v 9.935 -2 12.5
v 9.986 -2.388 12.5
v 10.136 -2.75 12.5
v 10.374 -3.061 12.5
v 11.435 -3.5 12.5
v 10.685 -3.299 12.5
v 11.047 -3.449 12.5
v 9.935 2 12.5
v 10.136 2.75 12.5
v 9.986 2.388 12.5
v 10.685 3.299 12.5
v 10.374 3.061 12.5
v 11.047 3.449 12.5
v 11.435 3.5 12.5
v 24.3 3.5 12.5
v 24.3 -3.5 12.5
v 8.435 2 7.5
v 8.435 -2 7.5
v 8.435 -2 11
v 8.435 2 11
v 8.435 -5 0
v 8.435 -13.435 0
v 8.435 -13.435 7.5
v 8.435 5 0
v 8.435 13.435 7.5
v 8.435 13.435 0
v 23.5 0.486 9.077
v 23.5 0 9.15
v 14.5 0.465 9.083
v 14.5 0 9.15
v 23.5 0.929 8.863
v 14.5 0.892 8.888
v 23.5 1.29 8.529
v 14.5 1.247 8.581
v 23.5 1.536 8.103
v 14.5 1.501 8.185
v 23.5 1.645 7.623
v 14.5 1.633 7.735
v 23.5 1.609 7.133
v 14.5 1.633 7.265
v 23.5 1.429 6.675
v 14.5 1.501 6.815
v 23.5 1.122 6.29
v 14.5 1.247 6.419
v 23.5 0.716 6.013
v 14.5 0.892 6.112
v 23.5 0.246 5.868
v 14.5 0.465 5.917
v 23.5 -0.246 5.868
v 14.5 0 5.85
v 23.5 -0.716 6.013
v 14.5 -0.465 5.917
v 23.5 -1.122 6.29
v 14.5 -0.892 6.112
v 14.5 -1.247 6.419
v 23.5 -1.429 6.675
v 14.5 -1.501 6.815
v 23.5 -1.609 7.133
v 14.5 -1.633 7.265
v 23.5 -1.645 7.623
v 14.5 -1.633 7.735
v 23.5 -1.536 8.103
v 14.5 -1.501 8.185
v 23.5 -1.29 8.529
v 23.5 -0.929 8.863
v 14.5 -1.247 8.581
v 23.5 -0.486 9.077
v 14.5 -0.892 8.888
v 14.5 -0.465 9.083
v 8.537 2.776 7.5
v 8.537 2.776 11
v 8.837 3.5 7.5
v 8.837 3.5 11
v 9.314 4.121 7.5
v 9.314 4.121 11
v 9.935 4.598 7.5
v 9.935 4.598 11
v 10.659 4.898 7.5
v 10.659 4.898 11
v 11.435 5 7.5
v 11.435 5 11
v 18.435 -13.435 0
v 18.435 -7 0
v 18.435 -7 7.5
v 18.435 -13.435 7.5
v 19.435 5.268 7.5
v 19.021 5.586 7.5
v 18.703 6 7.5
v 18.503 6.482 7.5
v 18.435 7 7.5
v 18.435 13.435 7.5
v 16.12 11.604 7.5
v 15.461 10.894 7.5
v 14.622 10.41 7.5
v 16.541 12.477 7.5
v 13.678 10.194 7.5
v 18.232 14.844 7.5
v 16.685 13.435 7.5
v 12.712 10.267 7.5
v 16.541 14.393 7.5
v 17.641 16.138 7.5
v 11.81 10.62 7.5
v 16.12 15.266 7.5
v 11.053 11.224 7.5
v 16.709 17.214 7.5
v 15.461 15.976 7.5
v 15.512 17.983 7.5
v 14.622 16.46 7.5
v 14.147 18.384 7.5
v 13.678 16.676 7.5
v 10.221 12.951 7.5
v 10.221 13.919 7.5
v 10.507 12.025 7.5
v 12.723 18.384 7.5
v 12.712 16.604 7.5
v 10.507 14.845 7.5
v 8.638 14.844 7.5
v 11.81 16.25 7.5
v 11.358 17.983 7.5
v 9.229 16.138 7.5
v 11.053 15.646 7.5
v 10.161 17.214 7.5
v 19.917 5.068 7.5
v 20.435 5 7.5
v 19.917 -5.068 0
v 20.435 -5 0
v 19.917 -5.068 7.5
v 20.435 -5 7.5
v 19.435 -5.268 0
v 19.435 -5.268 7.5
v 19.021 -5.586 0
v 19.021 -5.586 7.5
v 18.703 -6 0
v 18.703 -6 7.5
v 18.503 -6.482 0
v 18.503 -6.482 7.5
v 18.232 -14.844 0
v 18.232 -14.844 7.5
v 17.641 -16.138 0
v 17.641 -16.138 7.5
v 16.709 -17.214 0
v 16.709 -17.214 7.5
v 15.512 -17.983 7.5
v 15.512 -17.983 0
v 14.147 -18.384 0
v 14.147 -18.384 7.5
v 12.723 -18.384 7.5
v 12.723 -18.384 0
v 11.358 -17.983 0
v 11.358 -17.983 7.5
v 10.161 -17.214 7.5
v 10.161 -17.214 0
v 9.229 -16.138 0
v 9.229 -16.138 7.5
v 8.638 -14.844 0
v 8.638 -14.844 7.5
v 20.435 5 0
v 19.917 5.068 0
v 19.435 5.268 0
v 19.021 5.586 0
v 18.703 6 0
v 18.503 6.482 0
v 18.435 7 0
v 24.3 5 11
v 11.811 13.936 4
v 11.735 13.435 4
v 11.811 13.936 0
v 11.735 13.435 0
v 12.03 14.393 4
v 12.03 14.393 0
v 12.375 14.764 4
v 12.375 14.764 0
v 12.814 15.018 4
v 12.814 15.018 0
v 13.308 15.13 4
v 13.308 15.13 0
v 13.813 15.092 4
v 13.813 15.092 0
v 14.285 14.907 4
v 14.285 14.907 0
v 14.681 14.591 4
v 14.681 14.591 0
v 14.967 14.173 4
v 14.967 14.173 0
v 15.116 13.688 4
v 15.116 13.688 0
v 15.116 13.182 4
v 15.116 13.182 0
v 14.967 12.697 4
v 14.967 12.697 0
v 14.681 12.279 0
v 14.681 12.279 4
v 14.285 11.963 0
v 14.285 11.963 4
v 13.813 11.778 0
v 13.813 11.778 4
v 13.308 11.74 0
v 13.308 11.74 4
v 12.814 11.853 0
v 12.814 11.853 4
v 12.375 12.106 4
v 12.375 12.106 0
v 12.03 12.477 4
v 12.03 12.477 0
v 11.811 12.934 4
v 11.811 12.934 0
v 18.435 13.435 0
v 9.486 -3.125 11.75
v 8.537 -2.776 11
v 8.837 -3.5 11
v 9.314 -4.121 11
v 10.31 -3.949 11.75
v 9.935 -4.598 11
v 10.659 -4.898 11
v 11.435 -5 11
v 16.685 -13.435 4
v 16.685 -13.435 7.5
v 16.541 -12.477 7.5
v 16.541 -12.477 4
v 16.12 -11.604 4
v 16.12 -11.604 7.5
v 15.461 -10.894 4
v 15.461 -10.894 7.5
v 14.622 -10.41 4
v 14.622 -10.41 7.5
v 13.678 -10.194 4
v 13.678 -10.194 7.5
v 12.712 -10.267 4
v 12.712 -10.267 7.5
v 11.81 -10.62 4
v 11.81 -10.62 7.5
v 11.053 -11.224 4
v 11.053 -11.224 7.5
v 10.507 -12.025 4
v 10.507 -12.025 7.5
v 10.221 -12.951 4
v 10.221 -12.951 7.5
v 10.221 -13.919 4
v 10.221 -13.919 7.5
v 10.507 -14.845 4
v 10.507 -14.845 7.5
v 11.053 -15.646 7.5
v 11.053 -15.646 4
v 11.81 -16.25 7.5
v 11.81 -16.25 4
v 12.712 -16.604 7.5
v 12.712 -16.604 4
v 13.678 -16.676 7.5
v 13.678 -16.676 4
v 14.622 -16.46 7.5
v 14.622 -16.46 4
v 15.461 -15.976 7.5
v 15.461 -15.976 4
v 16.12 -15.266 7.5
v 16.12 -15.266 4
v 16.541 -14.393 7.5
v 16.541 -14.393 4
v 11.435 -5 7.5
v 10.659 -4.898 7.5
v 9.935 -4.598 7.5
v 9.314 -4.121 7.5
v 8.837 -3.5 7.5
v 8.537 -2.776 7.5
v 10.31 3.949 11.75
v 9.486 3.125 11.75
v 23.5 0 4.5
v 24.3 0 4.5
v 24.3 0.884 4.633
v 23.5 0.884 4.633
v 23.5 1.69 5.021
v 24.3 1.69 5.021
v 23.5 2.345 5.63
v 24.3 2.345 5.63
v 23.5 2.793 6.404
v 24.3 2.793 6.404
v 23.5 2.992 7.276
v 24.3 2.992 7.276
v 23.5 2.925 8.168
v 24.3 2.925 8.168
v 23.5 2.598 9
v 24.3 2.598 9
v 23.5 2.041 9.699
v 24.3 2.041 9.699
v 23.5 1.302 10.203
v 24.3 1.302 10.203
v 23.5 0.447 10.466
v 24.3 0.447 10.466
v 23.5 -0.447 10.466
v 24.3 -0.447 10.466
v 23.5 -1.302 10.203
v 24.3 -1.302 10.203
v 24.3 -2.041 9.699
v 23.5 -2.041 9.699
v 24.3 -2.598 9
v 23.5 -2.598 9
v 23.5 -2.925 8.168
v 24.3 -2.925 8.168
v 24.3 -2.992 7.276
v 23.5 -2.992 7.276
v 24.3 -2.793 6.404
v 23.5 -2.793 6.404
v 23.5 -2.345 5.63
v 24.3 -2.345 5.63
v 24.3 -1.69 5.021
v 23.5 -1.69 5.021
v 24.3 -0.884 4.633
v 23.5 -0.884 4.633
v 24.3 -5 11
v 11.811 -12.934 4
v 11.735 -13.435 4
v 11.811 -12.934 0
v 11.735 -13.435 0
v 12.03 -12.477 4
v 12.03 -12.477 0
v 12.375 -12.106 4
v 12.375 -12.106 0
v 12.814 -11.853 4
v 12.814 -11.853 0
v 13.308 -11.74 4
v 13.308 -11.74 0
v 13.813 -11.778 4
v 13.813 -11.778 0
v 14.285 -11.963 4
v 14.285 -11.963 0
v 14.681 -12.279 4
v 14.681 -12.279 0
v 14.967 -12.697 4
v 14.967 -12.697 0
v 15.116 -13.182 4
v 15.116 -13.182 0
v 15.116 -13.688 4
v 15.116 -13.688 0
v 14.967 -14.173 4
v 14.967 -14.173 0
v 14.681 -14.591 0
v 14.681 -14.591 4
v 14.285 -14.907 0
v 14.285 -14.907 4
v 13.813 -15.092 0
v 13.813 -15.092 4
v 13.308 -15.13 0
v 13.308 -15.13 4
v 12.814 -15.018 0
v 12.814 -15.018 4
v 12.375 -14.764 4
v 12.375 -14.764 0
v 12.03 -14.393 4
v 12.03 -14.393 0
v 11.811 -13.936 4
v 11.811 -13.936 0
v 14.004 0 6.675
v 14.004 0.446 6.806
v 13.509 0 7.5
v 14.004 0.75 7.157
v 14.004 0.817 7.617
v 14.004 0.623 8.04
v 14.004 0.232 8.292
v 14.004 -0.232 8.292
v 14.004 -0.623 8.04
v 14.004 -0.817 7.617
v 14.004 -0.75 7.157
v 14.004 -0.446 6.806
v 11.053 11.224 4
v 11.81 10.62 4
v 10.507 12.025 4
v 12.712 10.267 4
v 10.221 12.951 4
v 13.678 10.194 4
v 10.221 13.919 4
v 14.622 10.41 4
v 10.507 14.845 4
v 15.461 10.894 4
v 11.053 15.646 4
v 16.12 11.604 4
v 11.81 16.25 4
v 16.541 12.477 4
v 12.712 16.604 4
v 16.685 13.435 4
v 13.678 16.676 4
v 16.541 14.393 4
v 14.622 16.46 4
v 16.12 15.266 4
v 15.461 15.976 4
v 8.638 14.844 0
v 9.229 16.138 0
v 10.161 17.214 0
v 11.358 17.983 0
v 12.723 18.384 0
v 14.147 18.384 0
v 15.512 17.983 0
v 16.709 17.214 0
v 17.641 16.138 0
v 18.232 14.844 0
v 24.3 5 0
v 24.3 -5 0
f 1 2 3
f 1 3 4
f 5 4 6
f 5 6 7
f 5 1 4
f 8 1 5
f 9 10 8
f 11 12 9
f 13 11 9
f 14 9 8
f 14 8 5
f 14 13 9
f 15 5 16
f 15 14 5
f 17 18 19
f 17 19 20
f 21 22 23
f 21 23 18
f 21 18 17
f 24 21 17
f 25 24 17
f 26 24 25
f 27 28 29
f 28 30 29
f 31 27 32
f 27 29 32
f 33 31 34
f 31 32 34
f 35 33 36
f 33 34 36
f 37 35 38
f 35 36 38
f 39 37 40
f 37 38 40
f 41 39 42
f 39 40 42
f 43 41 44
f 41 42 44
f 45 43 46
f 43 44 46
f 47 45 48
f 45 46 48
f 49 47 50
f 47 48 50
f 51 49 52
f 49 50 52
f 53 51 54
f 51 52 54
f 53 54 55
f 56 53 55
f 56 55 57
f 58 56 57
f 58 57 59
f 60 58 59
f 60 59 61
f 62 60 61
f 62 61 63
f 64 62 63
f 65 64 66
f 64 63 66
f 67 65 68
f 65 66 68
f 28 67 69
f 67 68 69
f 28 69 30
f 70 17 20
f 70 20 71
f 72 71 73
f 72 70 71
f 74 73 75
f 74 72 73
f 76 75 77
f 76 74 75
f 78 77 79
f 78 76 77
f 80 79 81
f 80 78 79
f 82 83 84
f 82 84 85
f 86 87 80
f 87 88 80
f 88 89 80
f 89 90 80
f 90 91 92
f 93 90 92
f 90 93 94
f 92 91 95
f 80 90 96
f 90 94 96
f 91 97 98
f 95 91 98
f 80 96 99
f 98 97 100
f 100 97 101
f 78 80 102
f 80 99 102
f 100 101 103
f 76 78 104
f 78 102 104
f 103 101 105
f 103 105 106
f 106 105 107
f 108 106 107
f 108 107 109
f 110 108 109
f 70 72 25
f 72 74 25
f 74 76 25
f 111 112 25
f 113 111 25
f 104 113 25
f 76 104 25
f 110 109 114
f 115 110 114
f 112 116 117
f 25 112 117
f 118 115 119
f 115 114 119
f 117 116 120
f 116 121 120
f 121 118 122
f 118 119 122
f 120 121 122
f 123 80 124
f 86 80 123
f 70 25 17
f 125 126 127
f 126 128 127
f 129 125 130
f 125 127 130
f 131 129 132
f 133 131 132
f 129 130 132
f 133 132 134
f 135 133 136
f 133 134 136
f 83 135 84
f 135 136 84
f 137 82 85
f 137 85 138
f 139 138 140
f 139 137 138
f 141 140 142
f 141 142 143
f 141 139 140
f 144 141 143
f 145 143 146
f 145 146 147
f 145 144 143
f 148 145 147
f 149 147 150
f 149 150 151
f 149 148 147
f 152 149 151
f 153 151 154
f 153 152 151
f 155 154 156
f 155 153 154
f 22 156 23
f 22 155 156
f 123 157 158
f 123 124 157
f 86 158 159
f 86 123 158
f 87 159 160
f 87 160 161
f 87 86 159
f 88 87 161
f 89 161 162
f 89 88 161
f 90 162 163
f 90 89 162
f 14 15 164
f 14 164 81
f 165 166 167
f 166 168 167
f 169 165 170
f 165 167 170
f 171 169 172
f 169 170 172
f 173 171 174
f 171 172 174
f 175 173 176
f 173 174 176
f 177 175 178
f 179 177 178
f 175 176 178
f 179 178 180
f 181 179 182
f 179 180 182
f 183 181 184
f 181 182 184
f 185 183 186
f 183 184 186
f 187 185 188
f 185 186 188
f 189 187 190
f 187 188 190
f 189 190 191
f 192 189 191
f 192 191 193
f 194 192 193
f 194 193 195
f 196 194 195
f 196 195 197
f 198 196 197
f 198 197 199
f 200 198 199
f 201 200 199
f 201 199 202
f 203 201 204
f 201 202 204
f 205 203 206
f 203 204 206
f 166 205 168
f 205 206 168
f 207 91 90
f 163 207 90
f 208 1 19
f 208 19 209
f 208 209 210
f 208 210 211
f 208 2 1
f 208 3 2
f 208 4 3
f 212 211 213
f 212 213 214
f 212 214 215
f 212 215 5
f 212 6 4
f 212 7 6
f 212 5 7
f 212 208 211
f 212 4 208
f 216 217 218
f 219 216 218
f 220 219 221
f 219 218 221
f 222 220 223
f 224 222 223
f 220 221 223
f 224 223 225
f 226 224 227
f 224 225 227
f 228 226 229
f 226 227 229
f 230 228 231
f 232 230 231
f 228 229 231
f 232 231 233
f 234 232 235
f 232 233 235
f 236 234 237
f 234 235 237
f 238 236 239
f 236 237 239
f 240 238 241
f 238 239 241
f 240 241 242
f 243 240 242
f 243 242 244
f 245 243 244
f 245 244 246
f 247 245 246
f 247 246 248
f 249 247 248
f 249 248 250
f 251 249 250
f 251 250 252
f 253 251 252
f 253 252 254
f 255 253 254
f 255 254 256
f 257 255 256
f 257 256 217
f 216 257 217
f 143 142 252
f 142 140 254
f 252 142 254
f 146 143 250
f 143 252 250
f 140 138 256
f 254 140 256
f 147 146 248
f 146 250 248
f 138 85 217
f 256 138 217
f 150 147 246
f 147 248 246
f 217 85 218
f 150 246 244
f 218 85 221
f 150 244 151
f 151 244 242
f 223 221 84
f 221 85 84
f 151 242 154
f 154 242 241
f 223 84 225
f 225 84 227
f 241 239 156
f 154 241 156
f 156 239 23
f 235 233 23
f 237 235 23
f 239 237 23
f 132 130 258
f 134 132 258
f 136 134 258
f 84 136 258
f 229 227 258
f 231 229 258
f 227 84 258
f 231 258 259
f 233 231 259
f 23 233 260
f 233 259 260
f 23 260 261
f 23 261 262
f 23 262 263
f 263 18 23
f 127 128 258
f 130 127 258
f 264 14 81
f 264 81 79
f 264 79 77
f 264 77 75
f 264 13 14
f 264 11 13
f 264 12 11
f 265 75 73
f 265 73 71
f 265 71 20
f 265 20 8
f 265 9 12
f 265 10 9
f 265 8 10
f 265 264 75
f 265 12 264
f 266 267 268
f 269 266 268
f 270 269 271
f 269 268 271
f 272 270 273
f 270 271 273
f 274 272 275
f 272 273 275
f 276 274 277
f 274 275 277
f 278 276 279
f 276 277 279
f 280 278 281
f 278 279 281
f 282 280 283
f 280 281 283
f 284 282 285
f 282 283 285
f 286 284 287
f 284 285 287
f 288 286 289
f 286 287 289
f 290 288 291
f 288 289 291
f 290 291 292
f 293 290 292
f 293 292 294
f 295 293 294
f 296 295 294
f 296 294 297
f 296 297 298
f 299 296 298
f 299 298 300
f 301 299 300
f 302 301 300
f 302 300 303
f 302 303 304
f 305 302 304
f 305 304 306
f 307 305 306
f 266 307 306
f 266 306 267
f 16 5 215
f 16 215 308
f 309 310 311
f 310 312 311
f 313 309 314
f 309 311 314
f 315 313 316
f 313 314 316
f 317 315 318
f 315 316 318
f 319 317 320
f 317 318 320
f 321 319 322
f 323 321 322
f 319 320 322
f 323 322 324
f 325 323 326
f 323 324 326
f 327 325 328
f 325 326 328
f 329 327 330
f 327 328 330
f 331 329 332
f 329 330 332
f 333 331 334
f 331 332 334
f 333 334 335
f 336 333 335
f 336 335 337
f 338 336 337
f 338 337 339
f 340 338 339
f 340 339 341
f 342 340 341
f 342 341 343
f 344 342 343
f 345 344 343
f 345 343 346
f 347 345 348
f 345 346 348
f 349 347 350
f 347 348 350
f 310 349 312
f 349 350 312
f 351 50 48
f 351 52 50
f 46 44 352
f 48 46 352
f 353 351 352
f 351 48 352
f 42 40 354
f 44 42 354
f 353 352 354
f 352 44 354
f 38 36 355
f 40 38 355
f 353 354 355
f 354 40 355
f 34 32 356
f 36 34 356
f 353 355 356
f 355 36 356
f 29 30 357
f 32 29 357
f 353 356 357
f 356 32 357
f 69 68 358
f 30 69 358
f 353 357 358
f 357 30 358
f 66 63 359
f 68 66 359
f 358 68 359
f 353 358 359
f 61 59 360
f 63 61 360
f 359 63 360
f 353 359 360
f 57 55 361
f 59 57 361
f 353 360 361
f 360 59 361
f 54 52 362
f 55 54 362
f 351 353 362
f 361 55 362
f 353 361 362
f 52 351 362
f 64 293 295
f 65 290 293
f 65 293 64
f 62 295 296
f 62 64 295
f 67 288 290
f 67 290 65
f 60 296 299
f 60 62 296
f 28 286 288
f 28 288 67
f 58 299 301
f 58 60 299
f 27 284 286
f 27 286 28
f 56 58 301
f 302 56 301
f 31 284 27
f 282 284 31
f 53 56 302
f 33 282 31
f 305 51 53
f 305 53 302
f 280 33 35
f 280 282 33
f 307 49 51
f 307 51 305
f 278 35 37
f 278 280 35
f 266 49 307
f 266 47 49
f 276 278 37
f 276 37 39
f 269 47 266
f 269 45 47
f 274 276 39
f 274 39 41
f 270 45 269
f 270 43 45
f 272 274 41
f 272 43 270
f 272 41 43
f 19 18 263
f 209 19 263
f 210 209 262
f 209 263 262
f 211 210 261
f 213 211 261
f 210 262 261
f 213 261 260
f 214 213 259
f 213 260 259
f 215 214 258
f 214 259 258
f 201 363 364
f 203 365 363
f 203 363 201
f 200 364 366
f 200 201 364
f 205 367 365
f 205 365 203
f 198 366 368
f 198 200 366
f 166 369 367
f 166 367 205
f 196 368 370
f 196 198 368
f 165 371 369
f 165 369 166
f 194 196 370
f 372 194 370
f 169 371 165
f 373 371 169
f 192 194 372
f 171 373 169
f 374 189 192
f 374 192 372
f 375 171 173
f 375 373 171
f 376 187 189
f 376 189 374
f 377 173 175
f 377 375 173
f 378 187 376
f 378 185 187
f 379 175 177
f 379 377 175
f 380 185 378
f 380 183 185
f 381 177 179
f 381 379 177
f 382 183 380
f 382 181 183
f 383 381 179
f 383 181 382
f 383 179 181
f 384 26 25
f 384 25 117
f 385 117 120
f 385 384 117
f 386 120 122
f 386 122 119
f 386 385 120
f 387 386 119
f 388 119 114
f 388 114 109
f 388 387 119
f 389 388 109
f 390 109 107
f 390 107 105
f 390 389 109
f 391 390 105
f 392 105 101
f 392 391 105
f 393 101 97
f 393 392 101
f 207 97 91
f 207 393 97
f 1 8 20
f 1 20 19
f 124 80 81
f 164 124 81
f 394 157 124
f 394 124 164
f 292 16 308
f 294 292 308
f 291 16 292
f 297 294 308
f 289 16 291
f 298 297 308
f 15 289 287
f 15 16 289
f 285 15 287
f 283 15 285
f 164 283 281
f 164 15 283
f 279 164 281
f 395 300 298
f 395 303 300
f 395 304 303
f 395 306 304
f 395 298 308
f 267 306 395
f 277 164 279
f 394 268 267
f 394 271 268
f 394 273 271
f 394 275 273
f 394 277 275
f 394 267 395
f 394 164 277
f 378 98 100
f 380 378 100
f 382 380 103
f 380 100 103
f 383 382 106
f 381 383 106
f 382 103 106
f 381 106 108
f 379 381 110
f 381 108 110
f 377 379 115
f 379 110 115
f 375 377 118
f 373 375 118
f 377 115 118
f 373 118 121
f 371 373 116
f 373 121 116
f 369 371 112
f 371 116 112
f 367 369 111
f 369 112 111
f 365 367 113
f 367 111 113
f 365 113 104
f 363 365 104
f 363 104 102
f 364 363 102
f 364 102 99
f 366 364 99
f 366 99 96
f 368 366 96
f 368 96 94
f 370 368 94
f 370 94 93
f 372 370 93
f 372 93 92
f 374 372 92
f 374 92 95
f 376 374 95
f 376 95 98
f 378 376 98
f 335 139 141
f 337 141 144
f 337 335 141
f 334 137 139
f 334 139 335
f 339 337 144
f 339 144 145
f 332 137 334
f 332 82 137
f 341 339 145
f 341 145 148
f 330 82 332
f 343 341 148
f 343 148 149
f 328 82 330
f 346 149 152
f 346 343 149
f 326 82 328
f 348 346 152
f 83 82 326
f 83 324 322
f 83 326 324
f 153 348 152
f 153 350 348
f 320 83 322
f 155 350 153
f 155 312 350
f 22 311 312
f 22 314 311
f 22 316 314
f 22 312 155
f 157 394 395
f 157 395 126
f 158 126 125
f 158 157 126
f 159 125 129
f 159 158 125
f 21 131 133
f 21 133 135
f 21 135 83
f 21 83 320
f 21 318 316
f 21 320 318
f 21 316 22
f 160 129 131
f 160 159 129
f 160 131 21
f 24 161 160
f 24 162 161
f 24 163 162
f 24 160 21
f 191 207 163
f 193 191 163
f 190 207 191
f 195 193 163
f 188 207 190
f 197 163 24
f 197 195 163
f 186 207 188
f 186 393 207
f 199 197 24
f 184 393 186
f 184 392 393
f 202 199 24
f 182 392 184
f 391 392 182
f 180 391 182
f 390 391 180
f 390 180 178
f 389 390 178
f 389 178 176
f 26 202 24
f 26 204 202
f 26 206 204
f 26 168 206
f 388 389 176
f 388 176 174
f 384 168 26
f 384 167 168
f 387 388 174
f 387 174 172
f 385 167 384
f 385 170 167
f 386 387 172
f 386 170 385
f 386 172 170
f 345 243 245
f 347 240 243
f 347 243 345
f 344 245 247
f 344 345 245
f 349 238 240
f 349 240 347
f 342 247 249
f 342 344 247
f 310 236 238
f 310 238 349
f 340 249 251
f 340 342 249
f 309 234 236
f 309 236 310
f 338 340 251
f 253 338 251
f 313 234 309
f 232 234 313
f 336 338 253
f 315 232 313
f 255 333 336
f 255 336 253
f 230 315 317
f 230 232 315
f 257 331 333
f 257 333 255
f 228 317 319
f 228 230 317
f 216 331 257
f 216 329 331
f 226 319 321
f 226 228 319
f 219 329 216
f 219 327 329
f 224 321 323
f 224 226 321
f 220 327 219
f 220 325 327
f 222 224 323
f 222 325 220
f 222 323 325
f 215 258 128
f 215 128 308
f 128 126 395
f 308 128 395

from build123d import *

# Parameters (mm, degrees)
SKETCH_1_W                   = 15.864971157
SKETCH_1_H                   = 12.5
EXTRUDE_1_DEPTH              = 10
EXTRUDE_2_DEPTH              = 7.5
EXTRUDE_3_DEPTH              = 7.5
HOLE_WIZARD_M3_1_D           = 3.3
HOLE_WIZARD_M3_1_DEPTH       = 9.8
HOLE_WIZARD_M3_1_CBORE_D     = 6
HOLE_WIZARD_M3_1_CBORE_DEPTH = 0.8
HOLE_WIZARD_M3_1_TIP         = 0.991420021
HOLE_WIZARD_M3_2_D           = 3.4
HOLE_WIZARD_M3_2_CBORE_D     = 6.5
HOLE_WIZARD_M3_2_CBORE_DEPTH = 3.5
FILLET_1_R                   = 3
CHAMFER_1_SIZE               = 1.5
FILLET_2_R                   = 2


with BuildPart() as part:
    # 草图1 → 凸台-拉伸1 (new body)
    with BuildSketch(Plane(origin=(0, 5, 0), x_dir=(1, 0, 0), z_dir=(0, 1, 0))):
        with Locations((16.367514422, -6.25)):
            Rectangle(SKETCH_1_W, SKETCH_1_H)
    extrude(amount=-EXTRUDE_1_DEPTH)

    # 草图2 → 凸台-拉伸2 (add)
    with BuildSketch(Plane(origin=(0, 0, 0), x_dir=(-1, 0, 0), z_dir=(0, 0, -1))):
        with BuildLine():
            Line((-8.435028843, -5), (-18.435028843, -5))
            Line((-18.435028843, -5), (-18.435028843, -13.435028843))
            ThreePointArc((-18.435028843, -13.435028843), (-13.435028843, -18.435028843), (-8.435028843, -13.435028843))
            Line((-8.435028843, -13.435028843), (-8.435028843, -5))
        make_face()
    extrude(amount=-EXTRUDE_2_DEPTH)

    # 草图3 → 凸台-拉伸3 (add)
    with BuildSketch(Plane(origin=(0, 0, 0), x_dir=(-1, 0, 0), z_dir=(0, 0, -1))):
        with BuildLine():
            Line((-8.435028843, 5), (-8.435028843, 13.435028843))
            ThreePointArc((-8.435028843, 13.435028843), (-13.435028843, 18.435028843), (-18.435028843, 13.435028843))
            Line((-18.435028843, 13.435028843), (-18.435028843, 5))
            Line((-18.435028843, 5), (-8.435028843, 5))
        make_face()
    extrude(amount=-EXTRUDE_3_DEPTH)

    # M3 六角头机械螺钉的柱形沉头孔1
    with Locations(Plane(origin=(24.3, 0, 0), x_dir=(0, 0, -1), z_dir=(1, 0, 0))):
        with Locations((-7.5, 0)):
            CounterBoreHole(HOLE_WIZARD_M3_1_D / 2, HOLE_WIZARD_M3_1_CBORE_D / 2, HOLE_WIZARD_M3_1_CBORE_DEPTH, depth=HOLE_WIZARD_M3_1_DEPTH)
            with Locations((0, 0, -(HOLE_WIZARD_M3_1_DEPTH + HOLE_WIZARD_M3_1_TIP / 2))):  # 118° drill point
                Cone(0, HOLE_WIZARD_M3_1_D / 2, HOLE_WIZARD_M3_1_TIP, mode=Mode.SUBTRACT)

    # M3 六角头机械螺钉的柱形沉头孔2 (through all)
    with Locations(Plane.XY.offset(7.5)):
        with Locations((13.435028843, 13.435028843), (13.435028843, -13.435028843)):
            CounterBoreHole(HOLE_WIZARD_M3_2_D / 2, HOLE_WIZARD_M3_2_CBORE_D / 2, HOLE_WIZARD_M3_2_CBORE_DEPTH)

    # 圆角1
    fillet_1_edges = [part.edges().sort_by_distance(p)[0] for p in [
        (8.435028843, -5, 10),
        (8.435028843, 5, 10),
    ]]
    fillet(fillet_1_edges, radius=FILLET_1_R)

    # 倒角1
    chamfer_1_edges = [part.edges().sort_by_distance(p)[0] for p in [
        (8.435028843, 0, 12.5),
        (17.867514421, 5, 12.5),
        (17.867514421, -5, 12.5),
        (9.313708499, 4.121320344, 12.5),
        (9.313708499, -4.121320344, 12.5),
    ]]
    chamfer(chamfer_1_edges, length=CHAMFER_1_SIZE)

    # 圆角2
    fillet_2_edges = [part.edges().sort_by_distance(p)[0] for p in [
        (18.435028843, -5, 3.75),
        (18.435028843, 5, 3.75),
    ]]
    fillet(fillet_2_edges, radius=FILLET_2_R)


solid = part.part
